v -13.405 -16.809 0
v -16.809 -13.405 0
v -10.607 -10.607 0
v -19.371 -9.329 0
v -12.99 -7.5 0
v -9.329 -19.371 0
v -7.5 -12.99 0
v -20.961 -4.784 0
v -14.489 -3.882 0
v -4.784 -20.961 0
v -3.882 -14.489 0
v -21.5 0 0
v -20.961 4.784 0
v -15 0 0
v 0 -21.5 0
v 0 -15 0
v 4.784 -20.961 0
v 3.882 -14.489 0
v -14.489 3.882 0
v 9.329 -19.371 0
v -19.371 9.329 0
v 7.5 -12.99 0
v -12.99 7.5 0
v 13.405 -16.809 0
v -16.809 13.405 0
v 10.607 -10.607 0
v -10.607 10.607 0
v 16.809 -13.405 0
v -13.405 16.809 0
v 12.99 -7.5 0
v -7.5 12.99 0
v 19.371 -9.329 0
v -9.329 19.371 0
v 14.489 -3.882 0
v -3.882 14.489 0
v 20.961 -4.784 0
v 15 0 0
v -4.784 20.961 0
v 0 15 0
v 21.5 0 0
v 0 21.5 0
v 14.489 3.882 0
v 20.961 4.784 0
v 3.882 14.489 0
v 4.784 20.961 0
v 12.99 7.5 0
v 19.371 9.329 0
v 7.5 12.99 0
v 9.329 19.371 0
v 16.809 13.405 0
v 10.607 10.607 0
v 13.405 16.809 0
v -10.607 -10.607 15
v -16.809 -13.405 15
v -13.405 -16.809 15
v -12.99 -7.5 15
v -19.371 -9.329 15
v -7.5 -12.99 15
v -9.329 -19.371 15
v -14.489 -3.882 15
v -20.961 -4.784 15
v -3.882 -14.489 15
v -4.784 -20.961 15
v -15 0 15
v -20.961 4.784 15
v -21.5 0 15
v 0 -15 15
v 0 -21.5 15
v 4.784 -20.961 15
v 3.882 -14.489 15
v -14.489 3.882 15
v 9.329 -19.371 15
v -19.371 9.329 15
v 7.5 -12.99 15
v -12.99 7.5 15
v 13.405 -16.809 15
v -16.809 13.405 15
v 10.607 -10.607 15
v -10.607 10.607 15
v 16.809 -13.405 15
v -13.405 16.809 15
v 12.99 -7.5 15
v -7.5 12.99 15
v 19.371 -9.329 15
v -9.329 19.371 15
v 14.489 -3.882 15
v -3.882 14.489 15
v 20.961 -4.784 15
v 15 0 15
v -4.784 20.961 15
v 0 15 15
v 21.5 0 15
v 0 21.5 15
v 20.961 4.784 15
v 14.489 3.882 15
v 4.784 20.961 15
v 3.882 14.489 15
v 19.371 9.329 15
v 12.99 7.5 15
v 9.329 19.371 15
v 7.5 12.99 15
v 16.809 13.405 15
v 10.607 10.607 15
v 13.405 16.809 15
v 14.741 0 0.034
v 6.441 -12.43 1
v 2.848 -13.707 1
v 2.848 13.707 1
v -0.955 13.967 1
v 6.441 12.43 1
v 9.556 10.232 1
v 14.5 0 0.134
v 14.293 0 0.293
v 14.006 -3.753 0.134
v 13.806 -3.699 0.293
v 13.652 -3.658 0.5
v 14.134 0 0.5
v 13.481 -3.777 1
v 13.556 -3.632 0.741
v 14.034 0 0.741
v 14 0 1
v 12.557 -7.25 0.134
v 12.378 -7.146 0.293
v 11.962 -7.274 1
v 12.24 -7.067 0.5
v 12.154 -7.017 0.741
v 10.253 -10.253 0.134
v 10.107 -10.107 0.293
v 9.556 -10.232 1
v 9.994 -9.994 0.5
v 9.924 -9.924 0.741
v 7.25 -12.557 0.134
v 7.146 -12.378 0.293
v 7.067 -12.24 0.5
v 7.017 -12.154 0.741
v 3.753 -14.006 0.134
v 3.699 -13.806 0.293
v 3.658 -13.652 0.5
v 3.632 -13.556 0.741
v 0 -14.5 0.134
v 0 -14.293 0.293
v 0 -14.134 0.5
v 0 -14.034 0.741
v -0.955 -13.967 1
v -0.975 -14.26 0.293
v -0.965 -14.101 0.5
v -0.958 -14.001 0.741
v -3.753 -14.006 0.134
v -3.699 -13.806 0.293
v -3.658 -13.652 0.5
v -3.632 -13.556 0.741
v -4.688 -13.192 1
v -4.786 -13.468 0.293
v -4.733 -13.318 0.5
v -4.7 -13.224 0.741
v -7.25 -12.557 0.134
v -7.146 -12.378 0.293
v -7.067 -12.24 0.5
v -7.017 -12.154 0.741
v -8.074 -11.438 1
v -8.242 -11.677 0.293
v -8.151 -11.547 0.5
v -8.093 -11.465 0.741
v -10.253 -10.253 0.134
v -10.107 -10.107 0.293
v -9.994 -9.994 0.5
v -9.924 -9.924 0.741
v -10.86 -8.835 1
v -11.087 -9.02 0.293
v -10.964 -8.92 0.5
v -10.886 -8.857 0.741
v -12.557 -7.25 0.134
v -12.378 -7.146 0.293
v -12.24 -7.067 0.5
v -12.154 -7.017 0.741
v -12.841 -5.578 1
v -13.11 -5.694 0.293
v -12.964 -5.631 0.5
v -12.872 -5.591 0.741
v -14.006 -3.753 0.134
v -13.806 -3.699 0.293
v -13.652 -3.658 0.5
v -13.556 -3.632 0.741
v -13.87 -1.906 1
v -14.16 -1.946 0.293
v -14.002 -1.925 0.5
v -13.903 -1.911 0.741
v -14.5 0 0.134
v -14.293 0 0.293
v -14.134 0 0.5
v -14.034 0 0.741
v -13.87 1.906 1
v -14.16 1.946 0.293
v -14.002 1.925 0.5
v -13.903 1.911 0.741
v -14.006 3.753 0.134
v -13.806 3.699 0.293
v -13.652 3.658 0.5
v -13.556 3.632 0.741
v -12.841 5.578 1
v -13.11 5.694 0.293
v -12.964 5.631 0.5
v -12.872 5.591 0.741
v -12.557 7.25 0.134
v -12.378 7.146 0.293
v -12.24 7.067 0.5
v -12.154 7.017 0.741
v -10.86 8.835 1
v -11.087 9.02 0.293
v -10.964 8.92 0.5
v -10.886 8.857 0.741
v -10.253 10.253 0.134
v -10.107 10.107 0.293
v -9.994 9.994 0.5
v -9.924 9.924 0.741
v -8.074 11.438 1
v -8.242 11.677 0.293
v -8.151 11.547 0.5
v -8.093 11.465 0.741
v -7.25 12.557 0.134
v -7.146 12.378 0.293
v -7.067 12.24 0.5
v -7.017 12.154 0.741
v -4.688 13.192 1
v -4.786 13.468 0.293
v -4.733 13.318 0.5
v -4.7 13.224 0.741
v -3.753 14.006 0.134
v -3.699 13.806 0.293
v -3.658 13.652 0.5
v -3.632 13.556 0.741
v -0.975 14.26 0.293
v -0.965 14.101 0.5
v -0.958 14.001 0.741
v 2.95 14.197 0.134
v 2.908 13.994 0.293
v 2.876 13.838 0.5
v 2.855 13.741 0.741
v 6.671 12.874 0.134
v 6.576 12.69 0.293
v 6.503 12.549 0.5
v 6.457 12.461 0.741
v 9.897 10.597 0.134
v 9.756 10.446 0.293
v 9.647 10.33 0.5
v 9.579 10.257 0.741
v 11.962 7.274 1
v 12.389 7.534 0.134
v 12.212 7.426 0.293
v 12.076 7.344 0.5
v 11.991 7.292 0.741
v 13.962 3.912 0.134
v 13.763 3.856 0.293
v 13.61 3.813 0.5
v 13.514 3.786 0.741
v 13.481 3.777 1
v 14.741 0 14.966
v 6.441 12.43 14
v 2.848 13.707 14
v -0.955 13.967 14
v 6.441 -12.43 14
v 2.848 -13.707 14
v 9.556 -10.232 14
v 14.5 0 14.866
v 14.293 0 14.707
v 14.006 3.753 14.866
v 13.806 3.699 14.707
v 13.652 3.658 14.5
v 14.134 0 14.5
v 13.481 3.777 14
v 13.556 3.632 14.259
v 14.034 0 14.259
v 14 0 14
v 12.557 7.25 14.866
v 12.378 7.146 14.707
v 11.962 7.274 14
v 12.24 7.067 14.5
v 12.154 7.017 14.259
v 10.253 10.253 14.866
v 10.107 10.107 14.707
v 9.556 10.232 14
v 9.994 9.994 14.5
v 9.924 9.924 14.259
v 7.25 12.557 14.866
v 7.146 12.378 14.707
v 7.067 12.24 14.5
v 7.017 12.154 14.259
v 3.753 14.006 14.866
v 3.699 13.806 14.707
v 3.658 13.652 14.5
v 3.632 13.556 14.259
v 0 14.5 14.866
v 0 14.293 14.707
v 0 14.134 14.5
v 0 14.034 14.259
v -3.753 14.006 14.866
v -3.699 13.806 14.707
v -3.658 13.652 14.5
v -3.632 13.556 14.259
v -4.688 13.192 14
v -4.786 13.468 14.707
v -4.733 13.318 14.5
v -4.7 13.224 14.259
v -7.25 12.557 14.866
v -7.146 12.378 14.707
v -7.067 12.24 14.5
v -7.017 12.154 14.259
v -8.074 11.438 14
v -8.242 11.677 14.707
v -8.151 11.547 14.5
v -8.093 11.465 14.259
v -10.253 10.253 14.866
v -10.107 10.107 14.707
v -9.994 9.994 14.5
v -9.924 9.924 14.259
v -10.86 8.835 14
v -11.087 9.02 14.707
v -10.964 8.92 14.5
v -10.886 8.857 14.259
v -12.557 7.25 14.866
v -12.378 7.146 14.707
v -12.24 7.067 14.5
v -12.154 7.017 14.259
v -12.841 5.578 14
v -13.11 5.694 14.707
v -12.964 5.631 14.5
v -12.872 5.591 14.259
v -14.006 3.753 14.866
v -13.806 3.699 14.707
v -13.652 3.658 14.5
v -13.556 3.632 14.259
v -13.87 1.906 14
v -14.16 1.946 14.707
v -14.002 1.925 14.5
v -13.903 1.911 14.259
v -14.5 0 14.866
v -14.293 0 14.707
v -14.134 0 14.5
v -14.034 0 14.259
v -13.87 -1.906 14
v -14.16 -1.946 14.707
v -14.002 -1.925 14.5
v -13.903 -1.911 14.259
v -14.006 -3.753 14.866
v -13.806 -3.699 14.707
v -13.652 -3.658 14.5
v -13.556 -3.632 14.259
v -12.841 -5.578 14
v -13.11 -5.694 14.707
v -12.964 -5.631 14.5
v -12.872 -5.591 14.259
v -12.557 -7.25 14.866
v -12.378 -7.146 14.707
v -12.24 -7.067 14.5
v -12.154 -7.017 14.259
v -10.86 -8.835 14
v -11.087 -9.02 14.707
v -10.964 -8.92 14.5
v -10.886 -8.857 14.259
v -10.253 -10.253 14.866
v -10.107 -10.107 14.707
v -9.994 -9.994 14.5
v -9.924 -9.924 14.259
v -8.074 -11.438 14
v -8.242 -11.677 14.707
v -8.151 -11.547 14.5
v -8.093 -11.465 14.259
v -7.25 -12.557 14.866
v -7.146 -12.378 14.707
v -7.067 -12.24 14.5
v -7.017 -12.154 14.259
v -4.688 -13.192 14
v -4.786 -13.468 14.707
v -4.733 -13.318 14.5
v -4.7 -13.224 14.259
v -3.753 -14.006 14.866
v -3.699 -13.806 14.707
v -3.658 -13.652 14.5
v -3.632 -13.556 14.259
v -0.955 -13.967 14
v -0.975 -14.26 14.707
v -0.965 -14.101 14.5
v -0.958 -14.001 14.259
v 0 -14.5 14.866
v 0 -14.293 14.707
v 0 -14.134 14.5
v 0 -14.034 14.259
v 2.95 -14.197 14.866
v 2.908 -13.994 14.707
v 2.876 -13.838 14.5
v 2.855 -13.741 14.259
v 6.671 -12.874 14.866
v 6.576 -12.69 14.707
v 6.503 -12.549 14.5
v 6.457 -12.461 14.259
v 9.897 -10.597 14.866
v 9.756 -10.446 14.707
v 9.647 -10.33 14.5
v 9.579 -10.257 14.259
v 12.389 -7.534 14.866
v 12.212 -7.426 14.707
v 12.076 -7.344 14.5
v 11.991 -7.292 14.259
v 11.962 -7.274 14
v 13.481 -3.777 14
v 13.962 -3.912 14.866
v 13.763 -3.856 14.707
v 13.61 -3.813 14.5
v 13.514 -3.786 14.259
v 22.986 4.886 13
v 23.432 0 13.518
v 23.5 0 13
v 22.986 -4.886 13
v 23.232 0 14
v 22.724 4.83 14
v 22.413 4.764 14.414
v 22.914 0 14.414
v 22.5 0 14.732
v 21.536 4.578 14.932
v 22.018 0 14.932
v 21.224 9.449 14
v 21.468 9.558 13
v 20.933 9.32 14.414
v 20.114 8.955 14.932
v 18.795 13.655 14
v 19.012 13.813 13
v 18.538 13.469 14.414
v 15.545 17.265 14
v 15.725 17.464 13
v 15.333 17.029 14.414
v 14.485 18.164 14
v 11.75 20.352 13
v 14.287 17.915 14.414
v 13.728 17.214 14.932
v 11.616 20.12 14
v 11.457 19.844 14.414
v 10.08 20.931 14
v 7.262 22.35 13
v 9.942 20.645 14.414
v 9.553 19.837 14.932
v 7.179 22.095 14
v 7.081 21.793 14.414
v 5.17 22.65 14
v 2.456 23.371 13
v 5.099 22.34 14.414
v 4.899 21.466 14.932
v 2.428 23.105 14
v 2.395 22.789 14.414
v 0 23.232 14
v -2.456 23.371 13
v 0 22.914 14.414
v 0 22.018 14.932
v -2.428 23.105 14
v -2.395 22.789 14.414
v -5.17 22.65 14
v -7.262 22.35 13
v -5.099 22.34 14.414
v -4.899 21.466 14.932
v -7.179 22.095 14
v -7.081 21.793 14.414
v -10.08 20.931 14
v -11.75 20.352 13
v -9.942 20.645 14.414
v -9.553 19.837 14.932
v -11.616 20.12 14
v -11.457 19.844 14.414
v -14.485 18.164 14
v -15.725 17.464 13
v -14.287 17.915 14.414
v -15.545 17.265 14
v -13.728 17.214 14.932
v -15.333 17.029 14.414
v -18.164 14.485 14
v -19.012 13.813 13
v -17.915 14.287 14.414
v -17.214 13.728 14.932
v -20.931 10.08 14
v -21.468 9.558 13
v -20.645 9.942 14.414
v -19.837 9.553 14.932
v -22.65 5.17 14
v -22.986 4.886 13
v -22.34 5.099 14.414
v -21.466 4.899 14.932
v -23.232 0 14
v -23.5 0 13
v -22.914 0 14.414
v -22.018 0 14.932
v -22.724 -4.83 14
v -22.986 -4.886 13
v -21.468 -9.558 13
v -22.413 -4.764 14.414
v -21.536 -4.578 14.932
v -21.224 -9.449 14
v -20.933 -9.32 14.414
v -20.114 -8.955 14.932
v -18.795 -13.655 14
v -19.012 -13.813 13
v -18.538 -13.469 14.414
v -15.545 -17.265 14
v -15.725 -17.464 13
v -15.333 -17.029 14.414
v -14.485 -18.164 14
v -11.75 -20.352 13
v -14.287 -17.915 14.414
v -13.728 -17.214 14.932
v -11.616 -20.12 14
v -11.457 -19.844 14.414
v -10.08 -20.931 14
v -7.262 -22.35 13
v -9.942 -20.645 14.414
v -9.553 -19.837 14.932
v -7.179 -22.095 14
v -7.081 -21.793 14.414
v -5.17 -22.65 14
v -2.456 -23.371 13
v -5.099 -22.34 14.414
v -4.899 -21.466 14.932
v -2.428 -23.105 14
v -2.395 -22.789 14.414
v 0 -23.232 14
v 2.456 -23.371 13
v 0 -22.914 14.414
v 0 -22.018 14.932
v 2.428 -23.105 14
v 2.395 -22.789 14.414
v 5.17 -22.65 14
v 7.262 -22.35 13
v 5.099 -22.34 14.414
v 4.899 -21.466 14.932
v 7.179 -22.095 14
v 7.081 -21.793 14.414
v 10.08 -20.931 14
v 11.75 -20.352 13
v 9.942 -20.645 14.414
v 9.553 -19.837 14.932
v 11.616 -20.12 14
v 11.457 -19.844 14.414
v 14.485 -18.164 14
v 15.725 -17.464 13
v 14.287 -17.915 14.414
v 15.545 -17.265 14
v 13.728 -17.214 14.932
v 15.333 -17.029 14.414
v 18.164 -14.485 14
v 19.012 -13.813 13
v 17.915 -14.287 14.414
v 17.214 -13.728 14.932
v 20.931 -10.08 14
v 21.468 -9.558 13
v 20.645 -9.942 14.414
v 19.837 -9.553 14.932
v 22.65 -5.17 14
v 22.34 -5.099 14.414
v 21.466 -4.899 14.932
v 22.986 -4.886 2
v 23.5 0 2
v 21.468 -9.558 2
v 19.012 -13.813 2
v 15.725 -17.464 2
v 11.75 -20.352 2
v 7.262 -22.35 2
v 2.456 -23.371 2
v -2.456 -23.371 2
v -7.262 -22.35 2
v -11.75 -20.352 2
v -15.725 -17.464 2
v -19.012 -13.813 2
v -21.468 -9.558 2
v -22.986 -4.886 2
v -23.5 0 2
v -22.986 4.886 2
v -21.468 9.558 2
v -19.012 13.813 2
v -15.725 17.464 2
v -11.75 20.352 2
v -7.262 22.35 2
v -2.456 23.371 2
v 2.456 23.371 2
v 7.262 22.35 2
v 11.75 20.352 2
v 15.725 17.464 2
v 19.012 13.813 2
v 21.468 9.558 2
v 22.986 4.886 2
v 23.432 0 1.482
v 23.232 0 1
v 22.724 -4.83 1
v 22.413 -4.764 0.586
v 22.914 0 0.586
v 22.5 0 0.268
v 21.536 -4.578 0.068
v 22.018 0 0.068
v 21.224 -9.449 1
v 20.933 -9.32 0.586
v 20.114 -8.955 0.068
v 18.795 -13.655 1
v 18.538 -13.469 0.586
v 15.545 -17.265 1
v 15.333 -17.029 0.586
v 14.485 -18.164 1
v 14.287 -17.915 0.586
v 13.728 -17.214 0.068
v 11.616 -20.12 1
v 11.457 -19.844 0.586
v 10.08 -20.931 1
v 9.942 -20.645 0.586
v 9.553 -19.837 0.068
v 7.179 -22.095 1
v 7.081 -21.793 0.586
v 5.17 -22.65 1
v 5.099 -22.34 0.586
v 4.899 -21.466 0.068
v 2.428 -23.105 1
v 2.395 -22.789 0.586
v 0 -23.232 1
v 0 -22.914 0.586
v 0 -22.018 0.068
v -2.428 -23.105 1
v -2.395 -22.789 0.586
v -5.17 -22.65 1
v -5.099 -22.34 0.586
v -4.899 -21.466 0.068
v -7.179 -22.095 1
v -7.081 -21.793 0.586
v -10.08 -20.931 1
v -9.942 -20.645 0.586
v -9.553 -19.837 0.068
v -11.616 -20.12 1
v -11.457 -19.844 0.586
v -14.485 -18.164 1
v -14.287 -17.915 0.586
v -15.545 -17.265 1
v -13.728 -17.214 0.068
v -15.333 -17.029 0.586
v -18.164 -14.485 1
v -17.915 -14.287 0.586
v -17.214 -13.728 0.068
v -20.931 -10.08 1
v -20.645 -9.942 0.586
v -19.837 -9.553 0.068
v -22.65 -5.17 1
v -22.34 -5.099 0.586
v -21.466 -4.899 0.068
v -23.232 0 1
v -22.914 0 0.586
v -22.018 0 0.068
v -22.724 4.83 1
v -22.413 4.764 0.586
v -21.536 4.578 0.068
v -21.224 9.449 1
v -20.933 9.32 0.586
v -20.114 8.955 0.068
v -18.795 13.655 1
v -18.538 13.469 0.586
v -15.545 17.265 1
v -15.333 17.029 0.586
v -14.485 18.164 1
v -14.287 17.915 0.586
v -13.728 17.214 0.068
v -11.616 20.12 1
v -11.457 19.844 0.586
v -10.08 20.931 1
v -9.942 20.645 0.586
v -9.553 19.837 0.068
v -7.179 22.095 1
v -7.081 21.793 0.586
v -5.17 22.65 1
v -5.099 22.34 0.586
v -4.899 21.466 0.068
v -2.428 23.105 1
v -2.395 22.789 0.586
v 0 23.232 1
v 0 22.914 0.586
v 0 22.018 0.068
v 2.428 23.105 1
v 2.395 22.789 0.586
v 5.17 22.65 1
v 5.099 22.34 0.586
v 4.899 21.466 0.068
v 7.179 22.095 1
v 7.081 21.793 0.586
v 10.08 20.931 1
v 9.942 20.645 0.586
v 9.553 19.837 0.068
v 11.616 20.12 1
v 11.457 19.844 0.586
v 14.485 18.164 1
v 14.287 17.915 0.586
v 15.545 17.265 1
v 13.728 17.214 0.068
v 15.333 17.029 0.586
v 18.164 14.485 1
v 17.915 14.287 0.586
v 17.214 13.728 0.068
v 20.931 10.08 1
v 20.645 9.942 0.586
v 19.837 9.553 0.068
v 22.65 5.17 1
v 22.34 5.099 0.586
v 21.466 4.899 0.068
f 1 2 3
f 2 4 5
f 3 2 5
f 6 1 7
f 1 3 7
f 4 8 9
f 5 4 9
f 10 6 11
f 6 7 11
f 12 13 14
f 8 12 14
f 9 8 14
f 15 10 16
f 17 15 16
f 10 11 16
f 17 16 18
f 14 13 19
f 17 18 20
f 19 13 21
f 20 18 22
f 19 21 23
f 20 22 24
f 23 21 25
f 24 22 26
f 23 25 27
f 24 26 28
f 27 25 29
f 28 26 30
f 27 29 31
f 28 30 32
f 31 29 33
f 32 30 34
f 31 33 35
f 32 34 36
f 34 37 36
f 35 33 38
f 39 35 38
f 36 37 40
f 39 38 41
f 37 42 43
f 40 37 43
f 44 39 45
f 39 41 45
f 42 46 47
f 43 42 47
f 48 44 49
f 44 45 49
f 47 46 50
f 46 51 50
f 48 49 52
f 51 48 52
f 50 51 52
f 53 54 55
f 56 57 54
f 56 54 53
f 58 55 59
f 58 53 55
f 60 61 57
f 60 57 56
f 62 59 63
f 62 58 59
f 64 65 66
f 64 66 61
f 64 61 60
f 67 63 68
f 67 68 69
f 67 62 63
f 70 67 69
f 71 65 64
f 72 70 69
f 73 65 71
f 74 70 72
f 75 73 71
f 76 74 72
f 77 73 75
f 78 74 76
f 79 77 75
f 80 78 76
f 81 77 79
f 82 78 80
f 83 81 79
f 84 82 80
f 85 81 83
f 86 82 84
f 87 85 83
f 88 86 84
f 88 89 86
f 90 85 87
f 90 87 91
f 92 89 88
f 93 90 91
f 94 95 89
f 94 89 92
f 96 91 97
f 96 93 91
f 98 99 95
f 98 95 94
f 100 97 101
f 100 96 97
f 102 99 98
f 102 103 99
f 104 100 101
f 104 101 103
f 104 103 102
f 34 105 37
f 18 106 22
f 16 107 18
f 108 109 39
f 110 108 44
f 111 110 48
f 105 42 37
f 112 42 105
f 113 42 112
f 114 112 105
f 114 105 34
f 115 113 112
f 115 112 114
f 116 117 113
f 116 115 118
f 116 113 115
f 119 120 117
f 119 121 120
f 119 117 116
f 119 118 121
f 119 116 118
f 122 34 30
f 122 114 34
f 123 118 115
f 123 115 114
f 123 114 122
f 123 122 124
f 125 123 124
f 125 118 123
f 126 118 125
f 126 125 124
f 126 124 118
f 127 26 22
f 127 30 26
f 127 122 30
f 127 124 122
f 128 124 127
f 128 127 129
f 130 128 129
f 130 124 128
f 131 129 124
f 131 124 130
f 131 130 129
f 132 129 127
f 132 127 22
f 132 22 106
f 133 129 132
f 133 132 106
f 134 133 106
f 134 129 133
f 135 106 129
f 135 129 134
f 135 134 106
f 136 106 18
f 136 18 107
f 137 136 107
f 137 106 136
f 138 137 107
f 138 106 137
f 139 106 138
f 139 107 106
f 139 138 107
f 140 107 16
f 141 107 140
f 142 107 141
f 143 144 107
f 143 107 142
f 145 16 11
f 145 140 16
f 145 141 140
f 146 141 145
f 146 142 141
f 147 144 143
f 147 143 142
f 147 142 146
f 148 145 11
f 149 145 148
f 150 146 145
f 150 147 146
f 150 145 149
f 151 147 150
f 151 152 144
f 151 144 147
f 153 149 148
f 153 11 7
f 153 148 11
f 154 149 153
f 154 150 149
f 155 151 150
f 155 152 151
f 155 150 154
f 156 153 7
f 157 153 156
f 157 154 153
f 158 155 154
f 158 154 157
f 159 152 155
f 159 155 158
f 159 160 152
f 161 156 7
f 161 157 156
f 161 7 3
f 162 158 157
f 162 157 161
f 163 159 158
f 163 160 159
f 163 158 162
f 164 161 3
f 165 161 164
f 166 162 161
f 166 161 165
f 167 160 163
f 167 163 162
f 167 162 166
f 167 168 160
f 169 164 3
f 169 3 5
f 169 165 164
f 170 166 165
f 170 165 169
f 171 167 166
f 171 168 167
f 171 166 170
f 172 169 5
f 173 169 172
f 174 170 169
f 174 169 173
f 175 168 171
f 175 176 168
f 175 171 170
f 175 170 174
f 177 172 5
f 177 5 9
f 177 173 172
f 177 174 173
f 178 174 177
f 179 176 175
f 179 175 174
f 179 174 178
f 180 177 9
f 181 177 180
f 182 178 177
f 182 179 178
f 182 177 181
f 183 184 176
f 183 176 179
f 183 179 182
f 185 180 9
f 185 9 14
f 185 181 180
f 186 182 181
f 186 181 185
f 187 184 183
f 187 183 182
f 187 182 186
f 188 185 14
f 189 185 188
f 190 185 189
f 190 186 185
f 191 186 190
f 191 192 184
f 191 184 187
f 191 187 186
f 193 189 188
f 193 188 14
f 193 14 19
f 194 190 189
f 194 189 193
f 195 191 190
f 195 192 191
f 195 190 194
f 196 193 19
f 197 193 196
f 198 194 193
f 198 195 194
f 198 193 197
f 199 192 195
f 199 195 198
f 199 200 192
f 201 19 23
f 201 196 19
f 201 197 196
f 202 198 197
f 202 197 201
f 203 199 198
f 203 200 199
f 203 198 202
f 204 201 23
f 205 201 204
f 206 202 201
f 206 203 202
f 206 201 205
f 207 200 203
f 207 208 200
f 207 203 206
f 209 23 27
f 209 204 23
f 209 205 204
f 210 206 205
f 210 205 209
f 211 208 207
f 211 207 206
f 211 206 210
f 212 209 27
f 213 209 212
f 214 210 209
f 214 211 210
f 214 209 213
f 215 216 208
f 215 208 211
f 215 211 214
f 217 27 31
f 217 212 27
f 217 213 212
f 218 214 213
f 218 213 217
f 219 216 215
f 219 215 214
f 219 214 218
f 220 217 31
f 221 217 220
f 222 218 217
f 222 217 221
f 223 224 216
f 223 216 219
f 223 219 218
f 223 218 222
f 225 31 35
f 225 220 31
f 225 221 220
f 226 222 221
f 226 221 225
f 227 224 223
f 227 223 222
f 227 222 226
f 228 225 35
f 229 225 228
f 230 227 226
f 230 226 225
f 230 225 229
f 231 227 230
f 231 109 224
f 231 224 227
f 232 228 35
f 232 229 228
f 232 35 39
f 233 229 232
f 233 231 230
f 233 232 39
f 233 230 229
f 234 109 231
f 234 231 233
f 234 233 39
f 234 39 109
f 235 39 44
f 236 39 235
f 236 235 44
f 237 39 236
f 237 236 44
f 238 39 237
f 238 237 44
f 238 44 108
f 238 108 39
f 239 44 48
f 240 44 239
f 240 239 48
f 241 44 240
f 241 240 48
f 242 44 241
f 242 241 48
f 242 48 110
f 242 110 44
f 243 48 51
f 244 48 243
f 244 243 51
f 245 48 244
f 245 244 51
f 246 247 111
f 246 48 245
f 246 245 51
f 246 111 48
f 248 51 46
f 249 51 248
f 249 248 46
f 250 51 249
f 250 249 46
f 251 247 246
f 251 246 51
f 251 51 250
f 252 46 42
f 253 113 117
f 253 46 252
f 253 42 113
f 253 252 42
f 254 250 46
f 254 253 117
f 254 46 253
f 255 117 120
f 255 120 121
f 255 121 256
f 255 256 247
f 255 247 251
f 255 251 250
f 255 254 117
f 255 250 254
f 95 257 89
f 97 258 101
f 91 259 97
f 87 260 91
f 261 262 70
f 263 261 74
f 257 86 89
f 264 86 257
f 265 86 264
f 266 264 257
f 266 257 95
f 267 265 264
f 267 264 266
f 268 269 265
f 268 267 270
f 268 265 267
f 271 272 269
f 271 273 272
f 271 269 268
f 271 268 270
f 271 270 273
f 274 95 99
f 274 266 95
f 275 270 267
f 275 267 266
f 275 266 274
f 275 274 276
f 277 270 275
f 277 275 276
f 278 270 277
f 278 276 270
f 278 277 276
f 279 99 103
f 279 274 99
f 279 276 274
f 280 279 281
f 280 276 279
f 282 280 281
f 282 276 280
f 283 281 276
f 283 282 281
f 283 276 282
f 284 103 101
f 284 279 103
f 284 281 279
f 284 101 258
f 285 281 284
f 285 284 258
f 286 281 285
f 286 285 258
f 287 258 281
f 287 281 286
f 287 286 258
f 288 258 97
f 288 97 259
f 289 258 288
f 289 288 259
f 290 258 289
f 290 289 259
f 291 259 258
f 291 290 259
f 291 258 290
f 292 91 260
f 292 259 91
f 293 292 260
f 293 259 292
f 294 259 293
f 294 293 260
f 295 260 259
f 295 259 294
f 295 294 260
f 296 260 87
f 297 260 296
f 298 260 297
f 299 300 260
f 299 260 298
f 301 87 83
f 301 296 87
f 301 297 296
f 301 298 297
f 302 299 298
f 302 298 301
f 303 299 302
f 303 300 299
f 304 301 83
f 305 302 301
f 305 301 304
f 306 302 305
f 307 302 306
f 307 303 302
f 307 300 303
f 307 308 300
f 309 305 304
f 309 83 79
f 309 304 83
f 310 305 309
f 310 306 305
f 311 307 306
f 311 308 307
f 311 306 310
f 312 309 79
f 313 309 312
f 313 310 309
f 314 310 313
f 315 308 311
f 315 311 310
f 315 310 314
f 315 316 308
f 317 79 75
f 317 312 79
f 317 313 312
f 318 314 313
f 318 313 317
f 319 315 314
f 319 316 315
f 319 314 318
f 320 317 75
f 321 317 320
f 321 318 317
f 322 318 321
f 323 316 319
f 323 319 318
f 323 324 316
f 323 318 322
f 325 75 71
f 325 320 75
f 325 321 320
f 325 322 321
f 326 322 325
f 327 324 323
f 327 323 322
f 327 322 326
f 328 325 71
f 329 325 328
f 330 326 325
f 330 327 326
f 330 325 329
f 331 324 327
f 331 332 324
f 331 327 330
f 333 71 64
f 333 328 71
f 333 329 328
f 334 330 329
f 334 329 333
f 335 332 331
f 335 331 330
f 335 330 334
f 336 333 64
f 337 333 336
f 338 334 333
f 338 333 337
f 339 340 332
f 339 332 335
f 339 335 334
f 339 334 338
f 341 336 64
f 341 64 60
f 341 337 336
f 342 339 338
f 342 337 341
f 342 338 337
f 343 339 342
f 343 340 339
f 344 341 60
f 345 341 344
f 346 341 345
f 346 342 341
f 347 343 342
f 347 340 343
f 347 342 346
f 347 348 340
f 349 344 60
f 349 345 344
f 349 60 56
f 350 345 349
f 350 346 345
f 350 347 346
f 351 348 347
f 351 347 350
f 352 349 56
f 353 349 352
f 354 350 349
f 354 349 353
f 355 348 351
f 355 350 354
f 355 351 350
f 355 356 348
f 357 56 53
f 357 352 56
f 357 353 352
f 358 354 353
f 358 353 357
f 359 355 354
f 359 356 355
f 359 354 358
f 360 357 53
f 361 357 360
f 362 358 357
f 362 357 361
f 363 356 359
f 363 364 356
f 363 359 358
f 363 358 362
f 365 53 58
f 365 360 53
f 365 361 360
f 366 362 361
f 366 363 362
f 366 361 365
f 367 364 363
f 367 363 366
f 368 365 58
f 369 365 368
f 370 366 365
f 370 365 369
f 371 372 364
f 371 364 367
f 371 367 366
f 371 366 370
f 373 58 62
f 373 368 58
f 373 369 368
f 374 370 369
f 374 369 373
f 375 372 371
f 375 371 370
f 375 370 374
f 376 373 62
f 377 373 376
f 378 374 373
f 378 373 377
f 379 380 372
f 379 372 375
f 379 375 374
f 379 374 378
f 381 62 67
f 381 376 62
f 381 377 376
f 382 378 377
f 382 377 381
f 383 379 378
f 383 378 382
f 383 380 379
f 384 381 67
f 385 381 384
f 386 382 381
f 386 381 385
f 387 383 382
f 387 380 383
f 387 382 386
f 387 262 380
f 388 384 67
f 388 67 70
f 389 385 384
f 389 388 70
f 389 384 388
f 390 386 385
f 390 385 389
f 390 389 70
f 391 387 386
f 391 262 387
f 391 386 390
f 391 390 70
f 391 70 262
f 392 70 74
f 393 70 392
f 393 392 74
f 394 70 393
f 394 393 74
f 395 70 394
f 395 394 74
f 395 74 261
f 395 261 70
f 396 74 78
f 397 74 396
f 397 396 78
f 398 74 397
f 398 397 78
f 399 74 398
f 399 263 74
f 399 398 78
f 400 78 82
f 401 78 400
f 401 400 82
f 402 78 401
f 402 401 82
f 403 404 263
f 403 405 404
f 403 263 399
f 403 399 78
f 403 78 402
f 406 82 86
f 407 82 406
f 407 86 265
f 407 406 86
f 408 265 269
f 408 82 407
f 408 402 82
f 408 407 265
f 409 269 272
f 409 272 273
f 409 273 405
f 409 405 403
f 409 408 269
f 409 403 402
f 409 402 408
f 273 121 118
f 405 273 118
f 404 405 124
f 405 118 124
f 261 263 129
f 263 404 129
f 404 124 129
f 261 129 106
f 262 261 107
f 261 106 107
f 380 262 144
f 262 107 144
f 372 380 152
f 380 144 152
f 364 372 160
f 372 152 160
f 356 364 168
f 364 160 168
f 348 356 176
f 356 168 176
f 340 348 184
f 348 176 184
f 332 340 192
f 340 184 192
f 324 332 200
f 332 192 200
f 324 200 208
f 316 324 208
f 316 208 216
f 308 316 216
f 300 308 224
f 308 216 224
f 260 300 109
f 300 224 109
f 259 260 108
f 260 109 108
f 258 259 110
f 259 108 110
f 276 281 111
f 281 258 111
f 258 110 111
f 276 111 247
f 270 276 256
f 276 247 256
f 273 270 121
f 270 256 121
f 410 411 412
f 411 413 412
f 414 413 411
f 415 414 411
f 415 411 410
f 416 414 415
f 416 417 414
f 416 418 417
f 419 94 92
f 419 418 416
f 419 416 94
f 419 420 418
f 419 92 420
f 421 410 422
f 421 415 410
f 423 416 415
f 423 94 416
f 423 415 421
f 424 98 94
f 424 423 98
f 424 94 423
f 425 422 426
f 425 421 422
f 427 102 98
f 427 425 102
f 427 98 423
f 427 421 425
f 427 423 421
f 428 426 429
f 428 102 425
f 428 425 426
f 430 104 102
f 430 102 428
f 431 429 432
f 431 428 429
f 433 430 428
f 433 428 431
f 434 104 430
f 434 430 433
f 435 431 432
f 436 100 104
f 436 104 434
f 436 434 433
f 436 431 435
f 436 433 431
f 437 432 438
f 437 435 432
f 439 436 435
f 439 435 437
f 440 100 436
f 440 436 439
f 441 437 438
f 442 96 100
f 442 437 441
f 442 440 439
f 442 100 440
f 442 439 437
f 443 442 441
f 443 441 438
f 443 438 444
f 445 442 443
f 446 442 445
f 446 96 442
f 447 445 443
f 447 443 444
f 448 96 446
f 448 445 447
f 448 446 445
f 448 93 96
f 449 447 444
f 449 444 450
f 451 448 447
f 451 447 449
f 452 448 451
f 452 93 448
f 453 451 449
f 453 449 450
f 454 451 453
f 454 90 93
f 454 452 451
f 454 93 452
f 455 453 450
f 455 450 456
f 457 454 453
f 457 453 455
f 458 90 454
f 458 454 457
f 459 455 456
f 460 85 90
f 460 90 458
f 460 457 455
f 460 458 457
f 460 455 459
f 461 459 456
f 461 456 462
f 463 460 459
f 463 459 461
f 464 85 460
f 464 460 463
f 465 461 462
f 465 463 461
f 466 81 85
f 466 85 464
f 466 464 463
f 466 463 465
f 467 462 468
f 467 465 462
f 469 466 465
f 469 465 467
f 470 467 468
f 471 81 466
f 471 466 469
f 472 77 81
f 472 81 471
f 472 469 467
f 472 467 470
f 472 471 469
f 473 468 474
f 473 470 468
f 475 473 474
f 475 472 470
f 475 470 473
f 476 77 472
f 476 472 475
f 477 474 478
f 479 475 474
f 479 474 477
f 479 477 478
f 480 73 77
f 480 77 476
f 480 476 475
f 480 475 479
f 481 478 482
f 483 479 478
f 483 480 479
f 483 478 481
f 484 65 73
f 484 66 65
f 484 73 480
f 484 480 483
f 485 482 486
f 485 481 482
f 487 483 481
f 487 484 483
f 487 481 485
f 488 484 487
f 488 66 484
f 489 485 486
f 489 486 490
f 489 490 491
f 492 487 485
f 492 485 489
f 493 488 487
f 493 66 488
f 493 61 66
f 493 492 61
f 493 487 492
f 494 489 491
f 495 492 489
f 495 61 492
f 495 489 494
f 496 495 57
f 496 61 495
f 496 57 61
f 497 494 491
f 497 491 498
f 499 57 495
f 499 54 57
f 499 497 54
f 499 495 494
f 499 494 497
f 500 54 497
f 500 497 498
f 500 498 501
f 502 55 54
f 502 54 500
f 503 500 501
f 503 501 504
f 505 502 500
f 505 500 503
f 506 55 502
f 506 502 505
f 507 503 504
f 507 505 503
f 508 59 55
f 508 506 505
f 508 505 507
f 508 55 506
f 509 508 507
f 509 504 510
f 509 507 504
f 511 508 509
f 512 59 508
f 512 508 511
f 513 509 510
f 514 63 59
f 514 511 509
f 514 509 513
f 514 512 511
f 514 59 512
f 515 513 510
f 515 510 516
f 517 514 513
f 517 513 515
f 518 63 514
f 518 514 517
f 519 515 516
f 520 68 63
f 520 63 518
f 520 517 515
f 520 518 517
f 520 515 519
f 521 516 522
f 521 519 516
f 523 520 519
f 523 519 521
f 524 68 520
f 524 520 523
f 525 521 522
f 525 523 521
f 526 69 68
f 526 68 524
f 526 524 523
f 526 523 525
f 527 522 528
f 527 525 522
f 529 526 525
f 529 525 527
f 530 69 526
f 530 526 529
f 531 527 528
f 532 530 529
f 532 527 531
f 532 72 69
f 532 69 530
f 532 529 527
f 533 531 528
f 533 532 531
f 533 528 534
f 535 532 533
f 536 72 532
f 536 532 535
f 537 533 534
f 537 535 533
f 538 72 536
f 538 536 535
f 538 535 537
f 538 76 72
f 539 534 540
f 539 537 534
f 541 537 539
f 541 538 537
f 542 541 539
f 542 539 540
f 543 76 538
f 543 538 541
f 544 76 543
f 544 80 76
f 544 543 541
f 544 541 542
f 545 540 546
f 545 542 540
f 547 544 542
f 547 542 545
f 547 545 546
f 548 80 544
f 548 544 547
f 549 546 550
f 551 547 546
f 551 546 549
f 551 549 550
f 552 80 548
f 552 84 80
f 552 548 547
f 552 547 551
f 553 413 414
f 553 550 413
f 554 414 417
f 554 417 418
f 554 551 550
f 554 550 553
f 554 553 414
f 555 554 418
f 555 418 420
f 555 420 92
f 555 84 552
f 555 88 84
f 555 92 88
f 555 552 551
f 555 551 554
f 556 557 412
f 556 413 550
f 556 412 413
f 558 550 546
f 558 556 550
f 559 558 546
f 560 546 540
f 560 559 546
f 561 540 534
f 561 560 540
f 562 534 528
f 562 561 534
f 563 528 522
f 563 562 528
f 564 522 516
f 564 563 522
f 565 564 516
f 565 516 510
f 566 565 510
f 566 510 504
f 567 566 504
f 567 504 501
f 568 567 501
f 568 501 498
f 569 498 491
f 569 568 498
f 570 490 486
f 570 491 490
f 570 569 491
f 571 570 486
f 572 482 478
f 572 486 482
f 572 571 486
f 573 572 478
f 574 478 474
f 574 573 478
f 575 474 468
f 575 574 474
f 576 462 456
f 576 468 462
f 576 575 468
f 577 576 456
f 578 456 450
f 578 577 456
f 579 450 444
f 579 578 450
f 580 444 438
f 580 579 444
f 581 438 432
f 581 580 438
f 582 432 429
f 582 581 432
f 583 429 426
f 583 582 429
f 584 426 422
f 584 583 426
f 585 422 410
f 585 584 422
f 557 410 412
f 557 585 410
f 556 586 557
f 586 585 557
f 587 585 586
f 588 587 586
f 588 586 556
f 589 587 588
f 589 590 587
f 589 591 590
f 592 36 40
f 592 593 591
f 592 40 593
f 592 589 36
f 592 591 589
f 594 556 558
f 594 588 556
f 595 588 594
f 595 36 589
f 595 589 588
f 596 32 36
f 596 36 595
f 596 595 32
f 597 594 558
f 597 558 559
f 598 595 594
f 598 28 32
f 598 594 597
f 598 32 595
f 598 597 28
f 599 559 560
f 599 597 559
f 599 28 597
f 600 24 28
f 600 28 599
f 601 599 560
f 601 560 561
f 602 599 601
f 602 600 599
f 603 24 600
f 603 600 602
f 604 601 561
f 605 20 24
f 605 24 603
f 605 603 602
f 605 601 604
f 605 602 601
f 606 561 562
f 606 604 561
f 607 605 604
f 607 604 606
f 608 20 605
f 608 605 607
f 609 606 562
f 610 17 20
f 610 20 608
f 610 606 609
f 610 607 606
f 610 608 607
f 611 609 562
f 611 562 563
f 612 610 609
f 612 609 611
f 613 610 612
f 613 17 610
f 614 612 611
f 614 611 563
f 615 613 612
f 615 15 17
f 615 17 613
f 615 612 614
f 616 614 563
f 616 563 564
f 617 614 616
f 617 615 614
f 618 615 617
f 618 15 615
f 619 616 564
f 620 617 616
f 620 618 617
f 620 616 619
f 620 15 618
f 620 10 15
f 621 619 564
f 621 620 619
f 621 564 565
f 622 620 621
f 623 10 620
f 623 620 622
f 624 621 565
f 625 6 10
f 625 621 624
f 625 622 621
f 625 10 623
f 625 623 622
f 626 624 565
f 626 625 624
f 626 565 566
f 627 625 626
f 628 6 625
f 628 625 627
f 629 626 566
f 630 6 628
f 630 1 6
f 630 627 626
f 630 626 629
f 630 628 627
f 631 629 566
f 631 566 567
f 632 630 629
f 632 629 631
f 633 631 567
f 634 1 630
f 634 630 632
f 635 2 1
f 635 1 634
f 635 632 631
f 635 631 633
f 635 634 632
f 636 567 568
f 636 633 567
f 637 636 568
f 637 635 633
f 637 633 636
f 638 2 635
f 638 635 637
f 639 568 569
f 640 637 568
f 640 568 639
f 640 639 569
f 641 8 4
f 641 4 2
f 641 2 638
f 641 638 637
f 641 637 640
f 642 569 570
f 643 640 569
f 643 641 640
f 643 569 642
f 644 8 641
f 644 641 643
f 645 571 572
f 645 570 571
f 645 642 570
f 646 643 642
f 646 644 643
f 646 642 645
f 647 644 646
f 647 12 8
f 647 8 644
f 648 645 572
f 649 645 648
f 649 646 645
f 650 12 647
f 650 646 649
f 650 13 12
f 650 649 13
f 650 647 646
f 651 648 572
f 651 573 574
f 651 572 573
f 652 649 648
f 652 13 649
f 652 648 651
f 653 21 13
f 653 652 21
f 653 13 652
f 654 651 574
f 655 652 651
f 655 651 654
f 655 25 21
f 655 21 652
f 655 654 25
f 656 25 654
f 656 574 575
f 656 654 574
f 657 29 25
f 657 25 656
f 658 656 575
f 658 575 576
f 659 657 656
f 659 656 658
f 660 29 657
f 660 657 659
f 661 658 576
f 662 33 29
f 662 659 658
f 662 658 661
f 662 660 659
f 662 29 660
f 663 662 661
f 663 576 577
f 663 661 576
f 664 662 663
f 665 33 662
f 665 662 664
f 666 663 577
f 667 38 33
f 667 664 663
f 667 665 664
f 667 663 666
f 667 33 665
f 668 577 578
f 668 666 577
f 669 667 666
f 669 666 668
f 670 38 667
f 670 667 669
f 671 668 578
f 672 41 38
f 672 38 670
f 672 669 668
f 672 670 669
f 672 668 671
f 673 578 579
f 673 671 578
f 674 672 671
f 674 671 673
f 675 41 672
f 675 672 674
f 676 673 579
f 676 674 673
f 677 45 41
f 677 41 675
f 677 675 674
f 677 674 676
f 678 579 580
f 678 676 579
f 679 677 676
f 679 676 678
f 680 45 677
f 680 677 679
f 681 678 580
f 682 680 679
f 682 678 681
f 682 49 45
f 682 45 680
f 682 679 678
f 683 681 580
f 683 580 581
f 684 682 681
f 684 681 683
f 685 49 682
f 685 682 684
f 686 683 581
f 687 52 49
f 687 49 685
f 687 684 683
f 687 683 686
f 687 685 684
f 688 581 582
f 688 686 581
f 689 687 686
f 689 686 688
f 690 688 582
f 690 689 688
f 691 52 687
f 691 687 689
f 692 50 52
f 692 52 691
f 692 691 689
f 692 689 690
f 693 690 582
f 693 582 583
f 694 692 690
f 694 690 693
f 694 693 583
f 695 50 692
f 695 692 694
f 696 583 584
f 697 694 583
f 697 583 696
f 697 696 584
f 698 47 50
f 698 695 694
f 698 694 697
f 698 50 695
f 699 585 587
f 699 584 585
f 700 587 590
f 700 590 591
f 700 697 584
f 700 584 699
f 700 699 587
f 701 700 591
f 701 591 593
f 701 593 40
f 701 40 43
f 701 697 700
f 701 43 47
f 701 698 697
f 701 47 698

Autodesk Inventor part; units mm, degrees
ref_plane "YZ Plane" through (0, 0, 0) normal (1, 0, 0) x (0, 1, 0)
ref_plane "XZ Plane" through (0, 0, 0) normal (0, 1, 0) x (-1, 0, 0)
ref_plane "XY Plane" through (0, 0, 0) normal (0, 0, 1) x (1, 0, 0)
sketch "Sketch1" plane through (0, 0, 0) normal (0, 0, 1) x (1, 0, 0)
  circle A0 centre (0, 0) radius 14
  circle A1 centre (0, 0) radius 23.5
  dimension "d0" = 28
  dimension "d1" = 47
extrude "Extrusion1" add sketch "Sketch1" along normal blind 15
fillet "Fillet1" radius 2 2 edges at (-23.5, 0, 15) (-23.5, 0, 0)
fillet "Fillet2" radius 1 2 edges at (-14, 0, 0) (-14, 0, 15)
properties part number "U51105" material "Steel, Carbon"
